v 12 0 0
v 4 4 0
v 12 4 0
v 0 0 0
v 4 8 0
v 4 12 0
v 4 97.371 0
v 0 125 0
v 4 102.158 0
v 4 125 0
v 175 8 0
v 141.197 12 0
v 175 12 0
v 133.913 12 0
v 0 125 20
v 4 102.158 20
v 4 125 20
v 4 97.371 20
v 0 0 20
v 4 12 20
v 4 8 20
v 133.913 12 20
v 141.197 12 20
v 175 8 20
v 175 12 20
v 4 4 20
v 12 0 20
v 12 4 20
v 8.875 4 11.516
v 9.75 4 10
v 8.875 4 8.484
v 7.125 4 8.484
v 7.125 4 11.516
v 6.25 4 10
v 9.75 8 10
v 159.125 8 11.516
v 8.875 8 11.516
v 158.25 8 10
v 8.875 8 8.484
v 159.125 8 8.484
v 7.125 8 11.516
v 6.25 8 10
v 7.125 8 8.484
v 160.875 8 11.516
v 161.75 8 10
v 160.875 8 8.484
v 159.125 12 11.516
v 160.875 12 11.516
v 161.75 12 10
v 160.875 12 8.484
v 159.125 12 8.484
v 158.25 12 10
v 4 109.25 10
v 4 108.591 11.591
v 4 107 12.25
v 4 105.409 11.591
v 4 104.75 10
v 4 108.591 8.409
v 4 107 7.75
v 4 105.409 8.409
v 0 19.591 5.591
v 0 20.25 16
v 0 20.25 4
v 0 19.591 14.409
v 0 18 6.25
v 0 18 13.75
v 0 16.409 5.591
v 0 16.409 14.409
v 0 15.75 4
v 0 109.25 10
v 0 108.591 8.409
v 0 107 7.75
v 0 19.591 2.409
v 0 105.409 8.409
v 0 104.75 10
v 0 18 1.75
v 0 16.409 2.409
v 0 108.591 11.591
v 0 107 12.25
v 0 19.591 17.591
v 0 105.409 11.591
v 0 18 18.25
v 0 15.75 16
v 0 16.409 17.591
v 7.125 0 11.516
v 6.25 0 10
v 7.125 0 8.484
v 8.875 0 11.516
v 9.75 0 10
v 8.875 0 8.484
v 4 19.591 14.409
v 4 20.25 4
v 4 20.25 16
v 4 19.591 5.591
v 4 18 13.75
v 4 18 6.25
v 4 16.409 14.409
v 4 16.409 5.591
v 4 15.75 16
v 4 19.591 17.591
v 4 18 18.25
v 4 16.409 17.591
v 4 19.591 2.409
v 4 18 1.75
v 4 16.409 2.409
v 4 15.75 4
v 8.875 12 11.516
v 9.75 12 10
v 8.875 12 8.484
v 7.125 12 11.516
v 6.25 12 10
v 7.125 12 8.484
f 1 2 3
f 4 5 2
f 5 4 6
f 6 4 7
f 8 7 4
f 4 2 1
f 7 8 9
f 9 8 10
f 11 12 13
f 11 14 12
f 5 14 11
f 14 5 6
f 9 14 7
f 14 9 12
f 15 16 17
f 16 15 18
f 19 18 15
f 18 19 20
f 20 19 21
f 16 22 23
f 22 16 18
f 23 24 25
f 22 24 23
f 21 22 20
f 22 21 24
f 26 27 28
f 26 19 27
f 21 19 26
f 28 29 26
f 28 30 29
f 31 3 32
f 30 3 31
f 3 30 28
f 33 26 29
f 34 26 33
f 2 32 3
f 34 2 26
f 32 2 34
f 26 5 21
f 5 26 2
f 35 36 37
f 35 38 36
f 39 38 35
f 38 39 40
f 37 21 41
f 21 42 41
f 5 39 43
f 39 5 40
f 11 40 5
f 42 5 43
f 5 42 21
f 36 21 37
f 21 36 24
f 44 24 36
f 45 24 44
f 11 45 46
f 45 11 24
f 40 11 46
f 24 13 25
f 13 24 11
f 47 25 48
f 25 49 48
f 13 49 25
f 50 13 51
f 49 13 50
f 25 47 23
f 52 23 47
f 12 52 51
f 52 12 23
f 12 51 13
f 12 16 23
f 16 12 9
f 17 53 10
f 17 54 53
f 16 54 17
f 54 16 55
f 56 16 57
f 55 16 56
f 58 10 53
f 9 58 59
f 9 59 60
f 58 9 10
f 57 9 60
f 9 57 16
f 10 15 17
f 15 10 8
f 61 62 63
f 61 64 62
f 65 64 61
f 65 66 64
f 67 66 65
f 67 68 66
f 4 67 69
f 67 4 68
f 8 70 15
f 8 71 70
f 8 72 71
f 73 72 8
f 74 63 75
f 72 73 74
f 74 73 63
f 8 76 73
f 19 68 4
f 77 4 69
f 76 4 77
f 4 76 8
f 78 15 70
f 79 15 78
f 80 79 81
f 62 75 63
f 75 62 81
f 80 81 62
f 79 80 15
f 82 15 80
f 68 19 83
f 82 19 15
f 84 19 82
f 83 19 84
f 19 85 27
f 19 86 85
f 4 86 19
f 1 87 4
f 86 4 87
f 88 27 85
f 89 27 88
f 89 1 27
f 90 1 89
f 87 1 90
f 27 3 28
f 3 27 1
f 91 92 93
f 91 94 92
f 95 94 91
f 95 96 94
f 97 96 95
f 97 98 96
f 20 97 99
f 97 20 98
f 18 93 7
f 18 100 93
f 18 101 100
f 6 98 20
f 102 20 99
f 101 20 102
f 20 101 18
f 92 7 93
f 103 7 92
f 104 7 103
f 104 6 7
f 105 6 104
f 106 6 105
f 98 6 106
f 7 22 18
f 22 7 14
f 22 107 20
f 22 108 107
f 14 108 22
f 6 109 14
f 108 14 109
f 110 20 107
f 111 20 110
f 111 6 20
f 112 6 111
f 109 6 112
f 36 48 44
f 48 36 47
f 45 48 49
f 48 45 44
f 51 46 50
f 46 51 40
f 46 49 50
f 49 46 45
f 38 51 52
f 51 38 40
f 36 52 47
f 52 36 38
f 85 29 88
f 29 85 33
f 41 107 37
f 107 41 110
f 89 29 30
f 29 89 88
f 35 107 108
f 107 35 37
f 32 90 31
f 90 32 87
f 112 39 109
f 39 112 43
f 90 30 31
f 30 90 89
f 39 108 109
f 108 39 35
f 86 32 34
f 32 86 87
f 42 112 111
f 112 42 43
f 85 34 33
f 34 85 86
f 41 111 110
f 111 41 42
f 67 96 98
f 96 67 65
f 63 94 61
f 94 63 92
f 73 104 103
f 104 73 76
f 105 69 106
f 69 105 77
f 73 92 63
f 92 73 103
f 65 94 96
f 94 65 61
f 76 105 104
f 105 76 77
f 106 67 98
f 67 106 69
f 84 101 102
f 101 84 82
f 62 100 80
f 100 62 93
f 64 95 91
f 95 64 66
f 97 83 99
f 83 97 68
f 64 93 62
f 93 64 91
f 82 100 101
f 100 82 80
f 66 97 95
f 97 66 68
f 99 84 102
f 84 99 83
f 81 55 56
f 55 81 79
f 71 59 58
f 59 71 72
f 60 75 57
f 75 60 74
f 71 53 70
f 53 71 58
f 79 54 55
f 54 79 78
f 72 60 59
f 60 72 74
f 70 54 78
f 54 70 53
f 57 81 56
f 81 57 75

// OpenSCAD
// simplistic shelf plank wall mount

// triangle wall leg
height = 100;                                       // [50:200]
// triangle plank leg
arm = 140;                                          // [50:250]
// percentage of leg extension beyond triangle
protrude = 25;                                      // [0:100]
// width of mount
width = 20;                                         // [8:64]    
// structural strength 
strength = 4;                                       // [2:16]
// plank slot
plank = 4;                                          // [1:12]        
// diameter holes for fixing plank
screw_plank = 3.5;                                  // [0:0.1:8]
// diameter holes for wall mounting
screw_rear = 4.5;                                   // [0:0.1:12]
// percentage of width for wall mount hole distance
spacing_h = 20;                                     // [0:50]
// percentage of height for wall mount hole distance
spacing_v = 18;                                     // [0:50]

little = 0+0.01;

function percent(percentage, x) = x * percentage / 100;

difference()  {
    linear_extrude(width)  {                                                        // main structure
        square([strength, percent(100+protrude, height)]);                          // wall leg
        square([strength*3, strength]);                                             // plank clamp
        translate([0, strength+plank])
        square([percent(100+protrude, arm), strength]);                             // plank leg
        translate([arm, strength+plank])

        rotate([0, 0, 90-atan((height-strength-plank)/arm)])
        square([strength, sqrt(pow(arm, 2) + pow(height-strength-plank, 2))]);      // diagonal support
    }

    translate([arm*1.2-strength*2, strength+plank-little/2, width/2])
    rotate([270, 0, 0])
    cylinder(d=screw_plank, h=strength+little);                                     // front plank fixation

    translate([strength*2, -little/2, width/2])
    rotate([270, 0, 0])
    cylinder(d=screw_plank, h=strength+plank+strength+little);                      // rear plank fixation

    translate([-little/2, percent(spacing_v, height), percent(spacing_h, width)])
    wall_mount();                                                                   // top left wall mount

    translate([-little/2, percent(spacing_v, height), width-percent(spacing_h, width)])
    wall_mount();                                                                   // top right wall mount

    translate([-little/2, percent(100+protrude, height)-percent(spacing_v, height), width/2])
    wall_mount();                                                                   // bottom wall mount
}

module wall_mount()  {
    rotate([0, 90, 0])
    cylinder(d=screw_rear, h=strength+little);
}
